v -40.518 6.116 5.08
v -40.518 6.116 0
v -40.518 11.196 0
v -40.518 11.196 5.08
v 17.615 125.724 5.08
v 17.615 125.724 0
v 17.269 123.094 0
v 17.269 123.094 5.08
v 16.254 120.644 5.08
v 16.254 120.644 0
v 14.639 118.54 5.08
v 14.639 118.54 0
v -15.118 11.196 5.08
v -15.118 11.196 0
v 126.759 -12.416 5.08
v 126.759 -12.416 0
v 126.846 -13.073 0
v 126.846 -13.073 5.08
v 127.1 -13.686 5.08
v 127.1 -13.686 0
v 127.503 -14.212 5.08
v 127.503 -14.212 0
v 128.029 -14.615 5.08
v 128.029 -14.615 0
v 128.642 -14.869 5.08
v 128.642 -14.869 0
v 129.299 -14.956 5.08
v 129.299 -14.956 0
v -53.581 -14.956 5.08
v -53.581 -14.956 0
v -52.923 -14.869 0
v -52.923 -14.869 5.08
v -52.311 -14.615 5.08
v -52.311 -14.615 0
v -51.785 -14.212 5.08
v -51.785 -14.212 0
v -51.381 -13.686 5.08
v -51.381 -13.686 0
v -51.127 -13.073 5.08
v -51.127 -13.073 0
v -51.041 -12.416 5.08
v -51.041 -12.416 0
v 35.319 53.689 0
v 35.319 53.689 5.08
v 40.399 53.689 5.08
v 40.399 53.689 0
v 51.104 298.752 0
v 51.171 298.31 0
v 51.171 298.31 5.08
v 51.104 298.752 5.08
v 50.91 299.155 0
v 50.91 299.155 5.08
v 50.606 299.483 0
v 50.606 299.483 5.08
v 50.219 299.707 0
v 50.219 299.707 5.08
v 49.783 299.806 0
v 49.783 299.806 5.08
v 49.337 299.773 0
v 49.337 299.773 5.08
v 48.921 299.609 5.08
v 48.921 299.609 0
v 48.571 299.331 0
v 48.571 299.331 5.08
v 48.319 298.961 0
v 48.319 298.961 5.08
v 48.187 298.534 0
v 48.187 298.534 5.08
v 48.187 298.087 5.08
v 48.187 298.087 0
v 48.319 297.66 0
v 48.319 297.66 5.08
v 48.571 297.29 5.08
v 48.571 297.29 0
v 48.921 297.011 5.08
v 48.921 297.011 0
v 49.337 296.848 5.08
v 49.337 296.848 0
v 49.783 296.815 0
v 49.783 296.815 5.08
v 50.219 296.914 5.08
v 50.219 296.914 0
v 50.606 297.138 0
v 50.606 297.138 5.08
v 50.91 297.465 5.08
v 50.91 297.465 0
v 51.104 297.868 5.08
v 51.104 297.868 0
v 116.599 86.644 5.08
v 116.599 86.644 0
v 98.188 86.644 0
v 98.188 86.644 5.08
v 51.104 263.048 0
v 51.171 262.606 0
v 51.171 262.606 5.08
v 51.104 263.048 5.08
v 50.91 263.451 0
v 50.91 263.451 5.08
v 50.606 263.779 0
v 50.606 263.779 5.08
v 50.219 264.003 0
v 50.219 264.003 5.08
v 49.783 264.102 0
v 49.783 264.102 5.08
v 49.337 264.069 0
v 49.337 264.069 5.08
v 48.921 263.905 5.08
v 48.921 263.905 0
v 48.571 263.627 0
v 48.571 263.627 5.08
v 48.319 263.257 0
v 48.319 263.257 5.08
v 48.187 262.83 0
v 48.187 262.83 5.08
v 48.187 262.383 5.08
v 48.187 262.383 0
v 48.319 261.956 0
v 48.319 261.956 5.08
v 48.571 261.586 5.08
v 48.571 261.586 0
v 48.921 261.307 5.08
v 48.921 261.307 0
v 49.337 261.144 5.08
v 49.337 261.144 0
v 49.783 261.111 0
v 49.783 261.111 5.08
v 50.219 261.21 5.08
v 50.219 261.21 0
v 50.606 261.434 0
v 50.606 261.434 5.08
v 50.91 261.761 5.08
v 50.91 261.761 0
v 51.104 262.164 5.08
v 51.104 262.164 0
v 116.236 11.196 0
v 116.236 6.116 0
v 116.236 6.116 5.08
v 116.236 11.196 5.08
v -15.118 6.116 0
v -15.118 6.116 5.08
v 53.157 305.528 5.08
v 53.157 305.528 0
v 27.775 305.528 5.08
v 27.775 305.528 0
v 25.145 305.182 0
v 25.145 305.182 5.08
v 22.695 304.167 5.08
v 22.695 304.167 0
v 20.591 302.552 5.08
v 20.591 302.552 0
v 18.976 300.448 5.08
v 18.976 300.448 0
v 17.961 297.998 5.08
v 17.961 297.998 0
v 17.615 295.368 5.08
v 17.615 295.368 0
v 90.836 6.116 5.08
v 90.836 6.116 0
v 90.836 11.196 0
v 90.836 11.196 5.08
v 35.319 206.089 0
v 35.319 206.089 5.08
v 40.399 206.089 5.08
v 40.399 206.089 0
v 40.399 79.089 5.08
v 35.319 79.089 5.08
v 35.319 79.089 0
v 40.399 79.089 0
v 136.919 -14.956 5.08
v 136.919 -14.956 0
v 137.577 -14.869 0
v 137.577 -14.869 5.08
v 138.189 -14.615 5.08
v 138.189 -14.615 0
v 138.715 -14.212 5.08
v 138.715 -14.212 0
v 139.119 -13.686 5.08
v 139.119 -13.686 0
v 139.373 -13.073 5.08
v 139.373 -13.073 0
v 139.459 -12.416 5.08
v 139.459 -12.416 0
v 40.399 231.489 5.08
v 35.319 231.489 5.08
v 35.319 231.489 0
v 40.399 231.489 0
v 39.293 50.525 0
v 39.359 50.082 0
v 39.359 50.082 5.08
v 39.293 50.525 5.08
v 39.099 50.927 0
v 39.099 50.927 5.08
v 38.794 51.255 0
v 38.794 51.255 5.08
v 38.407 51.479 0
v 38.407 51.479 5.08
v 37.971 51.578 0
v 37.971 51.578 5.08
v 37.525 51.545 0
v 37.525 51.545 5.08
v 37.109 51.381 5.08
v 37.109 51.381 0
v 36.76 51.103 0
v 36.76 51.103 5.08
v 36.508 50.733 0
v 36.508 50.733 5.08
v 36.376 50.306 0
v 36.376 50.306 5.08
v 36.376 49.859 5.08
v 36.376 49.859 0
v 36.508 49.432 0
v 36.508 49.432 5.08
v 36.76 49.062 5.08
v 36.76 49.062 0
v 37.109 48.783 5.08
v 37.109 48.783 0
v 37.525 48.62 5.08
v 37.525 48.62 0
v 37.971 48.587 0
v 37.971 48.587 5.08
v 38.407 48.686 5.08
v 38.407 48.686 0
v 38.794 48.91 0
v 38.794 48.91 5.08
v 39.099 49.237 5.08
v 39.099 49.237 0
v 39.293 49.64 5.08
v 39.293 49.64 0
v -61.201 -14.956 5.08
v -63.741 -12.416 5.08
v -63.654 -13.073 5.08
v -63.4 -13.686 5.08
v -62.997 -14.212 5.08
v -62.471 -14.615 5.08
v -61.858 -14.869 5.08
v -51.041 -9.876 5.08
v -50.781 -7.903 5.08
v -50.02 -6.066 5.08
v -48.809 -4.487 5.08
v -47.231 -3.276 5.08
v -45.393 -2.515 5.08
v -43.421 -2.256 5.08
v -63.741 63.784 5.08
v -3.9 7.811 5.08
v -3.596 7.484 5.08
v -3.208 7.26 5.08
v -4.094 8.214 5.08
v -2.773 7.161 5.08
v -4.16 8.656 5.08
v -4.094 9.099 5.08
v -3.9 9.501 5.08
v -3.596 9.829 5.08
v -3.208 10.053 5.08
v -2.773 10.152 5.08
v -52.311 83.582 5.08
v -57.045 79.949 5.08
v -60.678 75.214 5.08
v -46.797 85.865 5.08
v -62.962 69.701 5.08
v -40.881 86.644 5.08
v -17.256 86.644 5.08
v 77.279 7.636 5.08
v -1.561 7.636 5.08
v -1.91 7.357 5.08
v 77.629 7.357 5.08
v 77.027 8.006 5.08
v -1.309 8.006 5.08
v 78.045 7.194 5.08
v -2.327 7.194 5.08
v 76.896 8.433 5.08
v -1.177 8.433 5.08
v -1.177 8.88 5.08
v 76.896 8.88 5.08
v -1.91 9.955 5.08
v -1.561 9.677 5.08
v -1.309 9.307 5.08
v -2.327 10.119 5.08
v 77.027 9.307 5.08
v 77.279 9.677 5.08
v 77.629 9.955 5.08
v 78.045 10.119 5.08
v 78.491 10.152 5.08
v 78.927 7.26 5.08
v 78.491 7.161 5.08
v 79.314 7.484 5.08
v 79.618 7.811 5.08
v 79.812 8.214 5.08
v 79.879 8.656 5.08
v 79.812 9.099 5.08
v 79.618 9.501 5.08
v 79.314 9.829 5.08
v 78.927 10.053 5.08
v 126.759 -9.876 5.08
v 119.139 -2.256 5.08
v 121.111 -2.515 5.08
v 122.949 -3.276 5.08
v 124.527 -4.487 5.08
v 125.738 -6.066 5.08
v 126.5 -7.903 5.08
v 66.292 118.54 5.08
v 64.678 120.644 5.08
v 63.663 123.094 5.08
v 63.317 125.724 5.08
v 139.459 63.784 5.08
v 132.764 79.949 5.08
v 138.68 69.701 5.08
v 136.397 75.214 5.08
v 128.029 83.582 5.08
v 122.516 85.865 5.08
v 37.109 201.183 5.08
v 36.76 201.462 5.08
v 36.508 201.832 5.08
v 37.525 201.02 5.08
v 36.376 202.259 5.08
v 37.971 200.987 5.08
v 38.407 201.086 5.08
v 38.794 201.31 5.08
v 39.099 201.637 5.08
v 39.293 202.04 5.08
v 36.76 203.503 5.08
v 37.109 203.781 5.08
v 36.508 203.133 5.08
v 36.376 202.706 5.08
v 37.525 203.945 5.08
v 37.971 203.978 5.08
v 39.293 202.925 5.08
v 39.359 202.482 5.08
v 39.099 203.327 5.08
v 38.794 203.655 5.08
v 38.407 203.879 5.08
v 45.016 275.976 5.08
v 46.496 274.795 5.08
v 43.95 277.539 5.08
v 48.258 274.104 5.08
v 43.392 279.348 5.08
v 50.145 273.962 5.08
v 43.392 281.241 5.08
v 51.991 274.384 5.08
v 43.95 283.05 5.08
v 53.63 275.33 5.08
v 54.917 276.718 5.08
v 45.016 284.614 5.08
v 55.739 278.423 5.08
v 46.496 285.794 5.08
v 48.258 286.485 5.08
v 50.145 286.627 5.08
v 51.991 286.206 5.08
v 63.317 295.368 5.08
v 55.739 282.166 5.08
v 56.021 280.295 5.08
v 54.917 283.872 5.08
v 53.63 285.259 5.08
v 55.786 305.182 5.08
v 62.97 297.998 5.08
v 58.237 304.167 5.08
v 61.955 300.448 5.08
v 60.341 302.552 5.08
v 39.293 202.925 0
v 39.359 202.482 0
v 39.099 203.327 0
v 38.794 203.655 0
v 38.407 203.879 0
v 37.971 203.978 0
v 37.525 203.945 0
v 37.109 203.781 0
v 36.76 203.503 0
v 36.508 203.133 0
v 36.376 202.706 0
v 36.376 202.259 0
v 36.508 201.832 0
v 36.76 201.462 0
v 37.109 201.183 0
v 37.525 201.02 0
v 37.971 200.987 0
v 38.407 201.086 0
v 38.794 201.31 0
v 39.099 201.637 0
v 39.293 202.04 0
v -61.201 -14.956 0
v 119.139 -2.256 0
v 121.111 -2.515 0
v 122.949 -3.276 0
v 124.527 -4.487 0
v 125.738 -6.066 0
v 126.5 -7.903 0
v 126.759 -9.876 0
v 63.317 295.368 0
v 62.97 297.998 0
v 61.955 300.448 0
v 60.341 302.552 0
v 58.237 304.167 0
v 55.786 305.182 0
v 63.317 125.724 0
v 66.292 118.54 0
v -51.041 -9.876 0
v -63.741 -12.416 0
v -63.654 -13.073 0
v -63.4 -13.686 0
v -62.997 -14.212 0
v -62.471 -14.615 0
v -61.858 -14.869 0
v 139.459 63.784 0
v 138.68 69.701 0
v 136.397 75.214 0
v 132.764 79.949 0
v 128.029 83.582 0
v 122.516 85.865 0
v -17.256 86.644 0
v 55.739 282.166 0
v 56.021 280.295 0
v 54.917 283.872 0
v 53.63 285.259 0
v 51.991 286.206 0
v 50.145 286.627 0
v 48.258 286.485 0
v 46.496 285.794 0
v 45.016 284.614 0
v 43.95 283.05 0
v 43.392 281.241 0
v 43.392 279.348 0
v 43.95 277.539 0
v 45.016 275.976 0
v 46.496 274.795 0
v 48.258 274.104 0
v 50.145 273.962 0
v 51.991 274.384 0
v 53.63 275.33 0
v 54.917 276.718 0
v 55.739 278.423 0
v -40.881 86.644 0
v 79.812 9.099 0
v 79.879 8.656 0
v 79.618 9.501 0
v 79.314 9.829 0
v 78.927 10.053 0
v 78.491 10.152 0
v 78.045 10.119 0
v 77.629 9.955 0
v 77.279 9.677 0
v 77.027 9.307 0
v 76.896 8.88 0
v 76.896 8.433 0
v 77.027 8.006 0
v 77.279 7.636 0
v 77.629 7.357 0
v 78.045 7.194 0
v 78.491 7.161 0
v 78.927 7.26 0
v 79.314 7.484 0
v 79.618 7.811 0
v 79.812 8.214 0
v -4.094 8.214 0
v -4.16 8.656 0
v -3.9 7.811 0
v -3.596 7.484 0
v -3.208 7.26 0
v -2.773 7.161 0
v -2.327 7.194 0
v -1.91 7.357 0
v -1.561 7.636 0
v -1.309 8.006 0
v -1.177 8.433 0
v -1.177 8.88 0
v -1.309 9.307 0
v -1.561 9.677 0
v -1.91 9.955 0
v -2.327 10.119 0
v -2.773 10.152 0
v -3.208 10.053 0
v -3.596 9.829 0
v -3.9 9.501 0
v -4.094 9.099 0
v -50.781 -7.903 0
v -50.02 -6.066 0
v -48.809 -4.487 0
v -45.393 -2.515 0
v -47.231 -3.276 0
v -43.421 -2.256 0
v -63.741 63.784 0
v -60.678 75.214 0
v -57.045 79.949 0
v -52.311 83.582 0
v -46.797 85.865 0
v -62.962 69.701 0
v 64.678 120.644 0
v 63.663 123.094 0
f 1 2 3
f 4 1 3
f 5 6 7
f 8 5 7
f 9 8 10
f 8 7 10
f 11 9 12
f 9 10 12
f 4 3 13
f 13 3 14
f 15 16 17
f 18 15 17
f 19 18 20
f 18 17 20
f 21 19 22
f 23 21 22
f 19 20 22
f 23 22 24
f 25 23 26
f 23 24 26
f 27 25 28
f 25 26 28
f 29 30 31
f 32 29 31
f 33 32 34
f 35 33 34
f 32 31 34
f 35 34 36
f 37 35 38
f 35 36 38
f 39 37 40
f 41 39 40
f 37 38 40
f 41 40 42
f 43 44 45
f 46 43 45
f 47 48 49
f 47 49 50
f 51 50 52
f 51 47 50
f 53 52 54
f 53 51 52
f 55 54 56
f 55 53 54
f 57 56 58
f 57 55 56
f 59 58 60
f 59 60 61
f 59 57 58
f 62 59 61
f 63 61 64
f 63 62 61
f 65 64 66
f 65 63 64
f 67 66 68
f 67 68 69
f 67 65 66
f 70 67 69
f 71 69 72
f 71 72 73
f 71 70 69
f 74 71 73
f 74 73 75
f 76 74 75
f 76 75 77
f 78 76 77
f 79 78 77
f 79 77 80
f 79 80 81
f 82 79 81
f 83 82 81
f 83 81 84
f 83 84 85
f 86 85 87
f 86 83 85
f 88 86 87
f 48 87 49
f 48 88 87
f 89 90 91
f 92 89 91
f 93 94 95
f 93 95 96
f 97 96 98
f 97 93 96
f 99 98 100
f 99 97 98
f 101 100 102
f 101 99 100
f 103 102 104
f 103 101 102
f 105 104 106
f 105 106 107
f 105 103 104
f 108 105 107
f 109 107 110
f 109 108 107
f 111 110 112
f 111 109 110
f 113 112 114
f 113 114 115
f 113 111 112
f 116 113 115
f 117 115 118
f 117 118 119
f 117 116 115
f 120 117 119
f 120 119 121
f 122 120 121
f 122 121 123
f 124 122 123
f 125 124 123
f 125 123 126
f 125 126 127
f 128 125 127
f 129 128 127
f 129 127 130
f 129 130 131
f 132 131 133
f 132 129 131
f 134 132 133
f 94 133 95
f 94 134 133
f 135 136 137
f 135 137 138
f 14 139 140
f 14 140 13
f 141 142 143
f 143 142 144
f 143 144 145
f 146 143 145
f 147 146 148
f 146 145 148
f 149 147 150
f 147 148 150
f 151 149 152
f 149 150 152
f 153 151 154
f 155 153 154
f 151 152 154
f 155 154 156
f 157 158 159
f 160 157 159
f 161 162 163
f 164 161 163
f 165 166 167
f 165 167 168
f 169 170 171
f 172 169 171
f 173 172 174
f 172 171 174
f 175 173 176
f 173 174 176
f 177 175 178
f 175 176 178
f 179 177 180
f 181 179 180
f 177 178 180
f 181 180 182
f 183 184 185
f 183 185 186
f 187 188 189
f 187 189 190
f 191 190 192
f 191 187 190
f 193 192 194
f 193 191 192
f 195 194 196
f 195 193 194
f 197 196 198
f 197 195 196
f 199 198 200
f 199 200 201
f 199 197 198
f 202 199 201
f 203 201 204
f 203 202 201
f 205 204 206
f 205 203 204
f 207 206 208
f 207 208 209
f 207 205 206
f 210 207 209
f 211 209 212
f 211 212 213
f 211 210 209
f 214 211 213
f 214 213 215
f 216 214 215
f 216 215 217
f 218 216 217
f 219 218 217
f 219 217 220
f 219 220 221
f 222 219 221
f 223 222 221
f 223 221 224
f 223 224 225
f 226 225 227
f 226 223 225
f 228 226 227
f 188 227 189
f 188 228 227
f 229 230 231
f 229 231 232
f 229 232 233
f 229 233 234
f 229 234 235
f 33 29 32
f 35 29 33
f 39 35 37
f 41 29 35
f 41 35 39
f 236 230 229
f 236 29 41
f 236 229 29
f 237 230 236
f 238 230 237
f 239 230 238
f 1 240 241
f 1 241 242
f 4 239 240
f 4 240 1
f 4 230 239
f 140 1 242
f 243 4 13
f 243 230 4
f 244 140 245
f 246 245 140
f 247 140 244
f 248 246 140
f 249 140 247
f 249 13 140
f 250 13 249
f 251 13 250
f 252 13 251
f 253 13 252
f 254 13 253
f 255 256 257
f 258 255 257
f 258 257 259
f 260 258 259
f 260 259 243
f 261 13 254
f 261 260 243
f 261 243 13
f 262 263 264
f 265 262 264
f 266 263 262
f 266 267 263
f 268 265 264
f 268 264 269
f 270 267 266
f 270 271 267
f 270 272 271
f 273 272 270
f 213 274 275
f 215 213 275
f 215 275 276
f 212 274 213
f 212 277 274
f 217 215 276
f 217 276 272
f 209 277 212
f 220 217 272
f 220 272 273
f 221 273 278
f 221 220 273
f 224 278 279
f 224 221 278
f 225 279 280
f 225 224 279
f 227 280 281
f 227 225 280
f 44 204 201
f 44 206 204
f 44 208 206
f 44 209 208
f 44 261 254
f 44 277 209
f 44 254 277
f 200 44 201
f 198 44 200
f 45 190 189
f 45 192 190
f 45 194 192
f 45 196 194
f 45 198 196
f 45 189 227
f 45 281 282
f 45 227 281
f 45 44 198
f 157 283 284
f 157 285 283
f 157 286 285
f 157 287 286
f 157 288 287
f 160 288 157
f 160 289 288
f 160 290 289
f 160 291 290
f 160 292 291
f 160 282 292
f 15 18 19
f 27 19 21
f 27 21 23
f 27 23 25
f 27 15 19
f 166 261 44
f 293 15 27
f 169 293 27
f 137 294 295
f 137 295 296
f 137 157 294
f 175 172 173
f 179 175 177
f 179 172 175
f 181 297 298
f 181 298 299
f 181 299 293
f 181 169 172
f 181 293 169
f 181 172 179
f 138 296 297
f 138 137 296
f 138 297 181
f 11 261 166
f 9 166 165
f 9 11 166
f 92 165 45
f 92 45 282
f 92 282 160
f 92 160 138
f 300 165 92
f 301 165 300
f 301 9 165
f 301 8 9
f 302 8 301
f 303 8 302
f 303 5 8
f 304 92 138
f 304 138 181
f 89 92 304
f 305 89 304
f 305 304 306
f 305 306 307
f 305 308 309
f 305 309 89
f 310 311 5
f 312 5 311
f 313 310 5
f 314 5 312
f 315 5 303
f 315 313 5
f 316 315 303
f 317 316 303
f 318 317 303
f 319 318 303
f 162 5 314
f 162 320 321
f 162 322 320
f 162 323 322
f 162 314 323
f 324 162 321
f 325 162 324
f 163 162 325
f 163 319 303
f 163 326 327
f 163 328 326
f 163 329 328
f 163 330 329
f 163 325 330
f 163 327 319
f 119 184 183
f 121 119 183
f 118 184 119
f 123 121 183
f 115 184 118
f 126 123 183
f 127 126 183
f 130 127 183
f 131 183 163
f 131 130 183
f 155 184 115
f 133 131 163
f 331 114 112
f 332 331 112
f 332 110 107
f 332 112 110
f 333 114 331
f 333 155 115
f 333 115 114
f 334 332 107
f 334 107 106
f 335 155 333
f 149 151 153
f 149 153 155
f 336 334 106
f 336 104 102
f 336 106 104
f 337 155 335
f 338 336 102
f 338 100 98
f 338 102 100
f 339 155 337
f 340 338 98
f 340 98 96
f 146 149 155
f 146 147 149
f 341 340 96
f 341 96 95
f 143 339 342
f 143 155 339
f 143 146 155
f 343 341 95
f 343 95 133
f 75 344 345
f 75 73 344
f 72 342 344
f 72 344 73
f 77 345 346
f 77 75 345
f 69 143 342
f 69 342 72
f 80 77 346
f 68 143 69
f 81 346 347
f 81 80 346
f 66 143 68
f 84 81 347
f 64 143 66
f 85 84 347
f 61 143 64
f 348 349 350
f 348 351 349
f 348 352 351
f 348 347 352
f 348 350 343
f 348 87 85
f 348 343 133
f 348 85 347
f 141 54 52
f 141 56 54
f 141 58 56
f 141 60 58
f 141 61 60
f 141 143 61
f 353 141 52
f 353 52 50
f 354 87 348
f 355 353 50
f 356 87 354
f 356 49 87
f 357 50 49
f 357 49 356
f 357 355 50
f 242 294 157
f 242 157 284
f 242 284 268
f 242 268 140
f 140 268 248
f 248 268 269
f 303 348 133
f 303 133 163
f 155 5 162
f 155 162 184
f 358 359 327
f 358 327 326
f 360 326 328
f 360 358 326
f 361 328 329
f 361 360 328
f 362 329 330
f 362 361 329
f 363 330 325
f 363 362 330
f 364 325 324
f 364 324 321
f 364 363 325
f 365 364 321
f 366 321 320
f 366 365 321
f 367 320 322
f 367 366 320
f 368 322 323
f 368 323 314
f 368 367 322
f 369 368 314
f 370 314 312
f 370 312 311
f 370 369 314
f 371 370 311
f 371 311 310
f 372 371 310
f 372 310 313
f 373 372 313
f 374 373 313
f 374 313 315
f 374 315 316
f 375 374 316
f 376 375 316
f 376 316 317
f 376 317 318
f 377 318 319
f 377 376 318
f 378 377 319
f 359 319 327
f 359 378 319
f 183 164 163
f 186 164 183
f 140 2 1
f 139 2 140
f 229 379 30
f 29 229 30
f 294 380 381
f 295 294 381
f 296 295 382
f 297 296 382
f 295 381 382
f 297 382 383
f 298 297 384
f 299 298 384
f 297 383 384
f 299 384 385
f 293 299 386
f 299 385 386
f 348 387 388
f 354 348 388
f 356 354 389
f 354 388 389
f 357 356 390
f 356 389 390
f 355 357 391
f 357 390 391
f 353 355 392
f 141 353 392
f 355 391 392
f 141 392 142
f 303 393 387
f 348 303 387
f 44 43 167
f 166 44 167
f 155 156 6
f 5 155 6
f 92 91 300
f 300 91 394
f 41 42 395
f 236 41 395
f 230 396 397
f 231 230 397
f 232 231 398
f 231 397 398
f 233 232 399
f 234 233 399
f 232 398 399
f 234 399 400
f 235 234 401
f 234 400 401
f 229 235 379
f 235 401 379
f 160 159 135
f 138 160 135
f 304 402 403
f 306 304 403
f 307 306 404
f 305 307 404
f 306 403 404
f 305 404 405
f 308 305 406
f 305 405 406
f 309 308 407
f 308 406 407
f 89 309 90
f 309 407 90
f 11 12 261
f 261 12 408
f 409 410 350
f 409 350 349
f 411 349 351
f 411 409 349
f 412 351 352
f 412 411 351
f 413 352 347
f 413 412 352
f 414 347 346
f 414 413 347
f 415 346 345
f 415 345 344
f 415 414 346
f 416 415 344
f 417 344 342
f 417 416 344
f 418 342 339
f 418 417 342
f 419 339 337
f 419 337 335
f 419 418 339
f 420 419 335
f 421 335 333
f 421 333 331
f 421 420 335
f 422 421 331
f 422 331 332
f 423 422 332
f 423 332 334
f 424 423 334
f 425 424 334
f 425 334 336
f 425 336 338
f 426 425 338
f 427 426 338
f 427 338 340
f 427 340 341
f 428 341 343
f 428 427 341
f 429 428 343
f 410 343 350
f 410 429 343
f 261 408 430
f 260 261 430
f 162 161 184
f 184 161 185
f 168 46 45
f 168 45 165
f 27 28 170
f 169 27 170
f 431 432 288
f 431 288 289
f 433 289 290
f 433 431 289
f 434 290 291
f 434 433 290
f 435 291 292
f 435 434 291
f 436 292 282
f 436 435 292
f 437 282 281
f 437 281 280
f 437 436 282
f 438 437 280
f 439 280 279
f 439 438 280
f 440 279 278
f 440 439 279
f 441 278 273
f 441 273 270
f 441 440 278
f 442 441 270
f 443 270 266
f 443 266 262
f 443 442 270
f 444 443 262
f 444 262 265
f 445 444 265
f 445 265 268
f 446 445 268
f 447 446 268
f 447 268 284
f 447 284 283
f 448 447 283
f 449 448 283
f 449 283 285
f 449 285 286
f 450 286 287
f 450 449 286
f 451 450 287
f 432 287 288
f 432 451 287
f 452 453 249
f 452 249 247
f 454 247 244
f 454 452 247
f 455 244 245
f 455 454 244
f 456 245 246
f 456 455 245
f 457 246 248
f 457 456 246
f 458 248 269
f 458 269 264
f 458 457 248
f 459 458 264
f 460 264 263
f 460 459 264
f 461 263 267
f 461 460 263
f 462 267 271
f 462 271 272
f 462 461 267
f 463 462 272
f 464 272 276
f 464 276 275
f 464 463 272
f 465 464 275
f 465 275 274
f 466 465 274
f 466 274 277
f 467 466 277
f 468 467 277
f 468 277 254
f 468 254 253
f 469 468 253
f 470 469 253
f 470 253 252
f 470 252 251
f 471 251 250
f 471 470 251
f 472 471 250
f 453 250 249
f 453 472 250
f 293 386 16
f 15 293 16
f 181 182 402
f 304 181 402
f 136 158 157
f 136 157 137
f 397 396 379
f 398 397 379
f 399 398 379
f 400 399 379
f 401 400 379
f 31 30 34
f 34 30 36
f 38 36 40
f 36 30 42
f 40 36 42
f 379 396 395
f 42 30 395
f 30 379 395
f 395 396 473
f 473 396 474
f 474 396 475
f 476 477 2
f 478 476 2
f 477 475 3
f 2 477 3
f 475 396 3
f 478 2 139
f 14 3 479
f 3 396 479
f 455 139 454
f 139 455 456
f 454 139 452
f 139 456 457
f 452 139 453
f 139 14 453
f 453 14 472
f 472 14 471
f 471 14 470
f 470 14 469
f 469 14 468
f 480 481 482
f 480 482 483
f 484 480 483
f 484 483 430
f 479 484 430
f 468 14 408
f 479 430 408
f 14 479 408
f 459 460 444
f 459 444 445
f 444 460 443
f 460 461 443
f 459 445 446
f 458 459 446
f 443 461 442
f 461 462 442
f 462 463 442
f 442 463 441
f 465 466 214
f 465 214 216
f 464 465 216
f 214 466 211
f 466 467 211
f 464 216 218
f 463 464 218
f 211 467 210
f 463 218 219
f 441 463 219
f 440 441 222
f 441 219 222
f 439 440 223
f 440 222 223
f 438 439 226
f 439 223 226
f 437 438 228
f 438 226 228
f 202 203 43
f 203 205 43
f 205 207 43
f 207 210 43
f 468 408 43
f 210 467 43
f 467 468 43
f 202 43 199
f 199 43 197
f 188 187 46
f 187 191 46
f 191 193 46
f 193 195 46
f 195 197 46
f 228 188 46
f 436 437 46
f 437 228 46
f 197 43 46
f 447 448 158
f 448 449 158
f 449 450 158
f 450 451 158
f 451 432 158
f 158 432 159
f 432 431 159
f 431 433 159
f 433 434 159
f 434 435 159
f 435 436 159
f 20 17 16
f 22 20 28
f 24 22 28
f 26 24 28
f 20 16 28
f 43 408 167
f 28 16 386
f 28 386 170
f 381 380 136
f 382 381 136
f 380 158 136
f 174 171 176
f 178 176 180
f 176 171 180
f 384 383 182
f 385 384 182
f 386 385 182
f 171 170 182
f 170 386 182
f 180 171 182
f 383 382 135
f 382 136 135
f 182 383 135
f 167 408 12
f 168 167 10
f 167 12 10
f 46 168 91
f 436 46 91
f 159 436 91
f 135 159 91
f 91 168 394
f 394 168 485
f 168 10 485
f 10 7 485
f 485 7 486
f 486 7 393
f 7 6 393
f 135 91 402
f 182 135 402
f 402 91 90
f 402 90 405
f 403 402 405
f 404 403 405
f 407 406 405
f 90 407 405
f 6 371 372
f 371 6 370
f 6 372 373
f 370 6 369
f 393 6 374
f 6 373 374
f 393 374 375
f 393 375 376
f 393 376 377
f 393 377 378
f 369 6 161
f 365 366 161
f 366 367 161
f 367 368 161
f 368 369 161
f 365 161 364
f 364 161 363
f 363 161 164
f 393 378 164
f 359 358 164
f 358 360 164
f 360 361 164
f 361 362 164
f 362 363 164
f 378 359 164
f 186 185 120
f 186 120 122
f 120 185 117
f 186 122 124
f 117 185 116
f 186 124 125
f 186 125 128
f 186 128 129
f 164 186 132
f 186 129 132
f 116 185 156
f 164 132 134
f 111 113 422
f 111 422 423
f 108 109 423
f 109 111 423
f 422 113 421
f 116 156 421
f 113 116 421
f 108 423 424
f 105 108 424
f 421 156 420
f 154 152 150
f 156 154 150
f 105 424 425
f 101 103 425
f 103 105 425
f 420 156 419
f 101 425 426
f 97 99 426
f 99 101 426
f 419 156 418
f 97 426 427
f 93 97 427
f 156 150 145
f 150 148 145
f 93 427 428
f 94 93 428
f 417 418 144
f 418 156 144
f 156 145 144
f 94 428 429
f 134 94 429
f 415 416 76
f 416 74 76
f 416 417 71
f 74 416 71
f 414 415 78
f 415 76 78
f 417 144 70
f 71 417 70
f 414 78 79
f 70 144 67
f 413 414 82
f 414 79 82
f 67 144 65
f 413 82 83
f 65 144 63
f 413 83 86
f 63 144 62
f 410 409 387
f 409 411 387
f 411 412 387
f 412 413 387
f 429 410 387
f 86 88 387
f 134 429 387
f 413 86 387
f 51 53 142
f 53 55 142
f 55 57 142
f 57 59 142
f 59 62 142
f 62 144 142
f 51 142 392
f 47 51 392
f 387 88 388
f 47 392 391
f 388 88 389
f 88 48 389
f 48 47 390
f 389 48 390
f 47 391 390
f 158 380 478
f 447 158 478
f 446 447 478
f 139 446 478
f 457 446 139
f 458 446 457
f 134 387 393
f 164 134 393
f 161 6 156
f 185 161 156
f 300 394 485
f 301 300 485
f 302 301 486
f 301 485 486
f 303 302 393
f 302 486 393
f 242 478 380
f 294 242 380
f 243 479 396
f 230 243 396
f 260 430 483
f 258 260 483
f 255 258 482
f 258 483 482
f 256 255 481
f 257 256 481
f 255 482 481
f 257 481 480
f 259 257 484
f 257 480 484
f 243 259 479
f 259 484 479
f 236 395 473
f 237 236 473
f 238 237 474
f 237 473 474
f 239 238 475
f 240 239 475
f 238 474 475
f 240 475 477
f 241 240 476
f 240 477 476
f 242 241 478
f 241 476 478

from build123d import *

# Parameters (mm, degrees)
SKETCH1_R           = 1.5
SKETCH1_R_2         = 6.35
SKETCH1_W           = 25.4
SKETCH1_H           = 5.08
SKETCH1_W_2         = 5.08
SKETCH1_H_2         = 25.4
BOSS_EXTRUDE1_DEPTH = 5.08


with BuildPart() as part:
    # Sketch1 → Boss-Extrude1 (new body)
    with BuildSketch(Plane.XY):
        with BuildLine():
            Line((-51.040787545, -12.415612204), (-51.040787545, -9.875612204))
            ThreePointArc((-51.040787545, -9.875612204), (-48.808941218, -4.487458531), (-43.420787545, -2.255612204))
            Line((-43.420787545, -2.255612204), (119.139212455, -2.255612204))
            ThreePointArc((119.139212455, -2.255612204), (124.527366128, -4.487458531), (126.759212455, -9.875612204))
            Line((126.759212455, -9.875612204), (126.759212455, -12.415612204))
            ThreePointArc((126.759212455, -12.415612204), (127.503161231, -14.211663428), (129.299212455, -14.955612204))
            Line((129.299212455, -14.955612204), (136.919212455, -14.955612204))
            ThreePointArc((136.919212455, -14.955612204), (138.715263679, -14.211663428), (139.459212455, -12.415612204))
            Line((139.459212455, -12.415612204), (139.459212455, 63.784387796))
            ThreePointArc((139.459212455, 63.784387796), (132.763673473, 79.948848814), (116.599212455, 86.644387796))
            Line((116.599212455, 86.644387796), (98.187659058, 86.644387796))
            Line((98.187659058, 86.644387796), (66.292302759, 118.539744095))
            ThreePointArc((66.292302759, 118.539744095), (64.089891606, 121.835885319), (63.316507656, 125.723948992))
            Line((63.316507656, 125.723948992), (63.316507656, 295.368236906))
            ThreePointArc((63.316507656, 295.368236906), (60.340712553, 302.552441803), (53.156507656, 305.528236906))
            Line((53.156507656, 305.528236906), (27.774726543, 305.528236906))
            ThreePointArc((27.774726543, 305.528236906), (20.590521646, 302.552441803), (17.614726543, 295.368236906))
            Line((17.614726543, 295.368236906), (17.614726543, 125.723948992))
            ThreePointArc((17.614726543, 125.723948992), (16.841342593, 121.835885319), (14.63893144, 118.539744095))
            Line((14.63893144, 118.539744095), (-17.256424859, 86.644387796))
            Line((-17.256424859, 86.644387796), (-40.880787545, 86.644387796))
            ThreePointArc((-40.880787545, 86.644387796), (-57.045248563, 79.948848814), (-63.740787545, 63.784387796))
            Line((-63.740787545, 63.784387796), (-63.740787545, -12.415612204))
            ThreePointArc((-63.740787545, -12.415612204), (-62.996838769, -14.211663428), (-61.200787545, -14.955612204))
            Line((-61.200787545, -14.955612204), (-53.580787545, -14.955612204))
            ThreePointArc((-53.580787545, -14.955612204), (-51.784736321, -14.211663428), (-51.040787545, -12.415612204))
        make_face()
        with Locations((37.859212455, 50.082420202)):
            Circle(SKETCH1_R, mode=Mode.SUBTRACT)
        with Locations((78.378833182, 8.65637608)):
            Circle(SKETCH1_R, mode=Mode.SUBTRACT)
        with Locations(Location((-2.660408273, 8.65637608, 0), (0, 0, 180))):
            Circle(SKETCH1_R, mode=Mode.SUBTRACT)
        with Locations((49.670678041, 298.310354304)):
            Circle(SKETCH1_R, mode=Mode.SUBTRACT)
        with Locations((49.670678041, 262.606350585)):
            Circle(SKETCH1_R, mode=Mode.SUBTRACT)
        with Locations((49.670678041, 280.294601083)):
            Circle(SKETCH1_R_2, mode=Mode.SUBTRACT)
        with Locations((37.859212455, 202.482420202)):
            Circle(SKETCH1_R, mode=Mode.SUBTRACT)
        with Locations((103.536086771, 8.65637608)):
            Rectangle(SKETCH1_W, SKETCH1_H, mode=Mode.SUBTRACT)
        with Locations((-27.817661861, 8.65637608)):
            Rectangle(SKETCH1_W, SKETCH1_H, mode=Mode.SUBTRACT)
        with Locations((37.859212455, 66.389058861)):
            Rectangle(SKETCH1_W_2, SKETCH1_H_2, mode=Mode.SUBTRACT)
        with Locations((37.859212455, 218.789058861)):
            Rectangle(SKETCH1_W_2, SKETCH1_H_2, mode=Mode.SUBTRACT)
    extrude(amount=BOSS_EXTRUDE1_DEPTH)


solid = part.part
